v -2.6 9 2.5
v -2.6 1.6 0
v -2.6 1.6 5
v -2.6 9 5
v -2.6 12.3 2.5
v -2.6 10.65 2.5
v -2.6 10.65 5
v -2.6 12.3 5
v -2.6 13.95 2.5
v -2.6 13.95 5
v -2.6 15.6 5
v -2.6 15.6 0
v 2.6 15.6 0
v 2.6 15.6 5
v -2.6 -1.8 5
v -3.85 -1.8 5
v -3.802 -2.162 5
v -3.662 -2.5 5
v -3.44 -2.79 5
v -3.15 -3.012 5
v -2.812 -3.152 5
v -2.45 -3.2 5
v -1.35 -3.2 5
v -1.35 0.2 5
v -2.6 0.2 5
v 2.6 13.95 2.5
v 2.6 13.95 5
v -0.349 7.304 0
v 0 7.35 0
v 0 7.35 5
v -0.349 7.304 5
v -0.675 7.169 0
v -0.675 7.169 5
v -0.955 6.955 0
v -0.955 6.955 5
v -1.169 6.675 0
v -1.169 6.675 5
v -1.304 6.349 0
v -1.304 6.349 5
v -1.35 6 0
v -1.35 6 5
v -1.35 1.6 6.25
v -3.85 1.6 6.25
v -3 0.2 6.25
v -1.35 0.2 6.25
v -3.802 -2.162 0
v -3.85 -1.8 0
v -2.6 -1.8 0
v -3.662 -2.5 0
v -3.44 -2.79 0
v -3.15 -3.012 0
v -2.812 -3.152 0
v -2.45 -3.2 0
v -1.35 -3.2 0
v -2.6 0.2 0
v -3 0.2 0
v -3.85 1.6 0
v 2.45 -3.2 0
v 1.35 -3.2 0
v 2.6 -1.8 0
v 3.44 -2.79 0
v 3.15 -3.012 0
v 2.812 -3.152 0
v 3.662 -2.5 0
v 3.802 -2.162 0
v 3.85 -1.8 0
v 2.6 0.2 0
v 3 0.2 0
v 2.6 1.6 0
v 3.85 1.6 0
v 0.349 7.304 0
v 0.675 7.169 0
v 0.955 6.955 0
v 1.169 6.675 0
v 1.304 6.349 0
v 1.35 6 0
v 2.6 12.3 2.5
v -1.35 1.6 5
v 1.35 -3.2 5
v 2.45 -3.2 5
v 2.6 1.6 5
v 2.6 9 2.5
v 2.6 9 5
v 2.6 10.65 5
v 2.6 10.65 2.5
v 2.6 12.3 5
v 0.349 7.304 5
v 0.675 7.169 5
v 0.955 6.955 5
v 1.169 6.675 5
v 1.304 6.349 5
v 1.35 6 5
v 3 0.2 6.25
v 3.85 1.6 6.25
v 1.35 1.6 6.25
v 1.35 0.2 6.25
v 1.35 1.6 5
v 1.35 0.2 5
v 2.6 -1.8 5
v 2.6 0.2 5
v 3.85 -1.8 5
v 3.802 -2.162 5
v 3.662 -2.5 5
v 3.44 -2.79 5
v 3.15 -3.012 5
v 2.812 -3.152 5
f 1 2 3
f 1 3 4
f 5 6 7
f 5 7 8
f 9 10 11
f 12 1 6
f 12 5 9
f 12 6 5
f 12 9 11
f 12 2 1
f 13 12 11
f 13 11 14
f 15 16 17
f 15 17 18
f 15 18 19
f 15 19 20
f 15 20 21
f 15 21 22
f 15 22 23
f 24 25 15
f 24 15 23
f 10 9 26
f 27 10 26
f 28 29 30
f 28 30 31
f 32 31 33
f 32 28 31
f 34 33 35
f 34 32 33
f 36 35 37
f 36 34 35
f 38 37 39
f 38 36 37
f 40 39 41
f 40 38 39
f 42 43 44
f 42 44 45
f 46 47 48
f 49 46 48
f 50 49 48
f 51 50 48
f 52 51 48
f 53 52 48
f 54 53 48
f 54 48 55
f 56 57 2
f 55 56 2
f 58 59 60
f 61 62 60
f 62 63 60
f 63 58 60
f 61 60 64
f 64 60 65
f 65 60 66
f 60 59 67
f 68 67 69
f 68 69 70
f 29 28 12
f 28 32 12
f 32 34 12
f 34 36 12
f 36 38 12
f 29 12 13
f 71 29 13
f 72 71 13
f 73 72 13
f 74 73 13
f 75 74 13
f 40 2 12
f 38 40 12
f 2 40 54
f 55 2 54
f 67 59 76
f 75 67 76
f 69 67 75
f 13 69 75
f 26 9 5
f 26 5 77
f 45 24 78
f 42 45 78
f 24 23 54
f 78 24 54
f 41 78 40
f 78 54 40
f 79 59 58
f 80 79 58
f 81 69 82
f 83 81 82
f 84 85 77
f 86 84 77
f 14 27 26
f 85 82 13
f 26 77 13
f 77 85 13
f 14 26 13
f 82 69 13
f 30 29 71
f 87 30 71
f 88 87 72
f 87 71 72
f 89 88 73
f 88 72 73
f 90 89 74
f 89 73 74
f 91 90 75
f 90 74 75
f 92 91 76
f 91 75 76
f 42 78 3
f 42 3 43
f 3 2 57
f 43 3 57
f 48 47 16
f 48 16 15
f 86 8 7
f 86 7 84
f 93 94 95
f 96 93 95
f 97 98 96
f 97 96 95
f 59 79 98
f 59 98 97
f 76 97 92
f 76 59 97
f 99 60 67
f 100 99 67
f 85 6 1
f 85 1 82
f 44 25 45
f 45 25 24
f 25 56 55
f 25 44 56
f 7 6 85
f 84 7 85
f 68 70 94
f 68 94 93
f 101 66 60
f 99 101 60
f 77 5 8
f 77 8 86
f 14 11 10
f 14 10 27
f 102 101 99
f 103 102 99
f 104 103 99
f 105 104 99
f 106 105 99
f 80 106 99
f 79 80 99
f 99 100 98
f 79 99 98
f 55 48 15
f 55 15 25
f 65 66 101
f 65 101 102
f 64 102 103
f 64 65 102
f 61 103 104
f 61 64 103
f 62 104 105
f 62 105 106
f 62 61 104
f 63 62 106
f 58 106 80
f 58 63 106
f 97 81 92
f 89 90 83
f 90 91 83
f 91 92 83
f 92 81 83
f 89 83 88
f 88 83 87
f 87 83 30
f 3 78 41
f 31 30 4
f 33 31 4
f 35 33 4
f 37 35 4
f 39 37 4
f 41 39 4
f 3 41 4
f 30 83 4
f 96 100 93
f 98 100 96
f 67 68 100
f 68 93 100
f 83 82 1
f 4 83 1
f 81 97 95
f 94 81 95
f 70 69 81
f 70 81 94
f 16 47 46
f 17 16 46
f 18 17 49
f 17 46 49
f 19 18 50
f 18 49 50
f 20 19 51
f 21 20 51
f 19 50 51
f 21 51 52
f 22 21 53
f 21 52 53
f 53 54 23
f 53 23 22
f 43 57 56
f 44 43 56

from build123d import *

# Parameters (mm, degrees)
PAD017_DEPTH           = 5
PAD020_DEPTH           = 6.25
SKETCH114_W            = 5.2
SKETCH114_H            = 1.65
PAD085_DEPTH           = 2.5
SKETCH115_W            = 5.2
SKETCH115_H            = 1.65
PAD086_DEPTH           = 5
LINEARPATTERN027_COUNT = 2
LINEARPATTERN027_PITCH = 3.3


with BuildPart() as bc_c:
    # Sketch034 → Pad017 (new body)
    with BuildSketch(Plane.XY):
        with BuildLine():
            Line((-1.35, -1.8), (-1.35, 6))
            ThreePointArc((0, 7.35), (-0.954594, 6.954594), (-1.35, 6))
            Line((0, 9), (0, 7.35))
            Line((-2.6, 9), (0, 9))
            Line((-2.6, -1.8), (-2.6, 9))
            Line((-3.85, -1.8), (-2.6, -1.8))
            ThreePointArc((-3.85, -1.8), (-3.439949, -2.789949), (-2.45, -3.2))
            Line((-1.35, -3.2), (-2.45, -3.2))
            Line((-1.35, -1.8), (-1.35, -3.2))
        make_face()
    extrude(amount=PAD017_DEPTH)

    # Sketch037 → Pad020 (join)
    with BuildSketch(Plane.XY):
        Polygon((-1.35, 0.2), (-1.35, 1.6), (-2.6, 1.6), (-3.85, 1.6), (-3, 0.2), (-2.6, 0.2), align=None)
    extrude(amount=PAD020_DEPTH)


with BuildPart() as bc_s_mirrored:
    # Mirror001: instance of _bc_c
    add(bc_c.part.mirror(Plane(origin=(0, 0, 0), x_dir=(0, 1, 0), z_dir=(-1, 0, 0))))


with BuildPart() as body043:
    # Fusion001 base: copy of _bc_c
    add(bc_c.part)

    # Fusion001: union _bc_s(mirrored)
    add(bc_s_mirrored.part)

    # Sketch114 → Pad085 (new body)
    with BuildSketch(Plane.XY):
        with Locations((0, 9.825)):
            Rectangle(SKETCH114_W, SKETCH114_H)
    pad085 = extrude(amount=PAD085_DEPTH)

    # Sketch115 → Pad086 (join)
    with BuildSketch(Plane.XY):
        with Locations((0, 11.475)):
            Rectangle(SKETCH115_W, SKETCH115_H)
    pad086 = extrude(amount=PAD086_DEPTH)

    # LinearPattern027: Pad085, Pad086 ×2
    with Locations(*[(0, i * LINEARPATTERN027_PITCH, 0) for i in range(1, LINEARPATTERN027_COUNT)]):
        add(pad085)
        add(pad086)


solid = body043.part
